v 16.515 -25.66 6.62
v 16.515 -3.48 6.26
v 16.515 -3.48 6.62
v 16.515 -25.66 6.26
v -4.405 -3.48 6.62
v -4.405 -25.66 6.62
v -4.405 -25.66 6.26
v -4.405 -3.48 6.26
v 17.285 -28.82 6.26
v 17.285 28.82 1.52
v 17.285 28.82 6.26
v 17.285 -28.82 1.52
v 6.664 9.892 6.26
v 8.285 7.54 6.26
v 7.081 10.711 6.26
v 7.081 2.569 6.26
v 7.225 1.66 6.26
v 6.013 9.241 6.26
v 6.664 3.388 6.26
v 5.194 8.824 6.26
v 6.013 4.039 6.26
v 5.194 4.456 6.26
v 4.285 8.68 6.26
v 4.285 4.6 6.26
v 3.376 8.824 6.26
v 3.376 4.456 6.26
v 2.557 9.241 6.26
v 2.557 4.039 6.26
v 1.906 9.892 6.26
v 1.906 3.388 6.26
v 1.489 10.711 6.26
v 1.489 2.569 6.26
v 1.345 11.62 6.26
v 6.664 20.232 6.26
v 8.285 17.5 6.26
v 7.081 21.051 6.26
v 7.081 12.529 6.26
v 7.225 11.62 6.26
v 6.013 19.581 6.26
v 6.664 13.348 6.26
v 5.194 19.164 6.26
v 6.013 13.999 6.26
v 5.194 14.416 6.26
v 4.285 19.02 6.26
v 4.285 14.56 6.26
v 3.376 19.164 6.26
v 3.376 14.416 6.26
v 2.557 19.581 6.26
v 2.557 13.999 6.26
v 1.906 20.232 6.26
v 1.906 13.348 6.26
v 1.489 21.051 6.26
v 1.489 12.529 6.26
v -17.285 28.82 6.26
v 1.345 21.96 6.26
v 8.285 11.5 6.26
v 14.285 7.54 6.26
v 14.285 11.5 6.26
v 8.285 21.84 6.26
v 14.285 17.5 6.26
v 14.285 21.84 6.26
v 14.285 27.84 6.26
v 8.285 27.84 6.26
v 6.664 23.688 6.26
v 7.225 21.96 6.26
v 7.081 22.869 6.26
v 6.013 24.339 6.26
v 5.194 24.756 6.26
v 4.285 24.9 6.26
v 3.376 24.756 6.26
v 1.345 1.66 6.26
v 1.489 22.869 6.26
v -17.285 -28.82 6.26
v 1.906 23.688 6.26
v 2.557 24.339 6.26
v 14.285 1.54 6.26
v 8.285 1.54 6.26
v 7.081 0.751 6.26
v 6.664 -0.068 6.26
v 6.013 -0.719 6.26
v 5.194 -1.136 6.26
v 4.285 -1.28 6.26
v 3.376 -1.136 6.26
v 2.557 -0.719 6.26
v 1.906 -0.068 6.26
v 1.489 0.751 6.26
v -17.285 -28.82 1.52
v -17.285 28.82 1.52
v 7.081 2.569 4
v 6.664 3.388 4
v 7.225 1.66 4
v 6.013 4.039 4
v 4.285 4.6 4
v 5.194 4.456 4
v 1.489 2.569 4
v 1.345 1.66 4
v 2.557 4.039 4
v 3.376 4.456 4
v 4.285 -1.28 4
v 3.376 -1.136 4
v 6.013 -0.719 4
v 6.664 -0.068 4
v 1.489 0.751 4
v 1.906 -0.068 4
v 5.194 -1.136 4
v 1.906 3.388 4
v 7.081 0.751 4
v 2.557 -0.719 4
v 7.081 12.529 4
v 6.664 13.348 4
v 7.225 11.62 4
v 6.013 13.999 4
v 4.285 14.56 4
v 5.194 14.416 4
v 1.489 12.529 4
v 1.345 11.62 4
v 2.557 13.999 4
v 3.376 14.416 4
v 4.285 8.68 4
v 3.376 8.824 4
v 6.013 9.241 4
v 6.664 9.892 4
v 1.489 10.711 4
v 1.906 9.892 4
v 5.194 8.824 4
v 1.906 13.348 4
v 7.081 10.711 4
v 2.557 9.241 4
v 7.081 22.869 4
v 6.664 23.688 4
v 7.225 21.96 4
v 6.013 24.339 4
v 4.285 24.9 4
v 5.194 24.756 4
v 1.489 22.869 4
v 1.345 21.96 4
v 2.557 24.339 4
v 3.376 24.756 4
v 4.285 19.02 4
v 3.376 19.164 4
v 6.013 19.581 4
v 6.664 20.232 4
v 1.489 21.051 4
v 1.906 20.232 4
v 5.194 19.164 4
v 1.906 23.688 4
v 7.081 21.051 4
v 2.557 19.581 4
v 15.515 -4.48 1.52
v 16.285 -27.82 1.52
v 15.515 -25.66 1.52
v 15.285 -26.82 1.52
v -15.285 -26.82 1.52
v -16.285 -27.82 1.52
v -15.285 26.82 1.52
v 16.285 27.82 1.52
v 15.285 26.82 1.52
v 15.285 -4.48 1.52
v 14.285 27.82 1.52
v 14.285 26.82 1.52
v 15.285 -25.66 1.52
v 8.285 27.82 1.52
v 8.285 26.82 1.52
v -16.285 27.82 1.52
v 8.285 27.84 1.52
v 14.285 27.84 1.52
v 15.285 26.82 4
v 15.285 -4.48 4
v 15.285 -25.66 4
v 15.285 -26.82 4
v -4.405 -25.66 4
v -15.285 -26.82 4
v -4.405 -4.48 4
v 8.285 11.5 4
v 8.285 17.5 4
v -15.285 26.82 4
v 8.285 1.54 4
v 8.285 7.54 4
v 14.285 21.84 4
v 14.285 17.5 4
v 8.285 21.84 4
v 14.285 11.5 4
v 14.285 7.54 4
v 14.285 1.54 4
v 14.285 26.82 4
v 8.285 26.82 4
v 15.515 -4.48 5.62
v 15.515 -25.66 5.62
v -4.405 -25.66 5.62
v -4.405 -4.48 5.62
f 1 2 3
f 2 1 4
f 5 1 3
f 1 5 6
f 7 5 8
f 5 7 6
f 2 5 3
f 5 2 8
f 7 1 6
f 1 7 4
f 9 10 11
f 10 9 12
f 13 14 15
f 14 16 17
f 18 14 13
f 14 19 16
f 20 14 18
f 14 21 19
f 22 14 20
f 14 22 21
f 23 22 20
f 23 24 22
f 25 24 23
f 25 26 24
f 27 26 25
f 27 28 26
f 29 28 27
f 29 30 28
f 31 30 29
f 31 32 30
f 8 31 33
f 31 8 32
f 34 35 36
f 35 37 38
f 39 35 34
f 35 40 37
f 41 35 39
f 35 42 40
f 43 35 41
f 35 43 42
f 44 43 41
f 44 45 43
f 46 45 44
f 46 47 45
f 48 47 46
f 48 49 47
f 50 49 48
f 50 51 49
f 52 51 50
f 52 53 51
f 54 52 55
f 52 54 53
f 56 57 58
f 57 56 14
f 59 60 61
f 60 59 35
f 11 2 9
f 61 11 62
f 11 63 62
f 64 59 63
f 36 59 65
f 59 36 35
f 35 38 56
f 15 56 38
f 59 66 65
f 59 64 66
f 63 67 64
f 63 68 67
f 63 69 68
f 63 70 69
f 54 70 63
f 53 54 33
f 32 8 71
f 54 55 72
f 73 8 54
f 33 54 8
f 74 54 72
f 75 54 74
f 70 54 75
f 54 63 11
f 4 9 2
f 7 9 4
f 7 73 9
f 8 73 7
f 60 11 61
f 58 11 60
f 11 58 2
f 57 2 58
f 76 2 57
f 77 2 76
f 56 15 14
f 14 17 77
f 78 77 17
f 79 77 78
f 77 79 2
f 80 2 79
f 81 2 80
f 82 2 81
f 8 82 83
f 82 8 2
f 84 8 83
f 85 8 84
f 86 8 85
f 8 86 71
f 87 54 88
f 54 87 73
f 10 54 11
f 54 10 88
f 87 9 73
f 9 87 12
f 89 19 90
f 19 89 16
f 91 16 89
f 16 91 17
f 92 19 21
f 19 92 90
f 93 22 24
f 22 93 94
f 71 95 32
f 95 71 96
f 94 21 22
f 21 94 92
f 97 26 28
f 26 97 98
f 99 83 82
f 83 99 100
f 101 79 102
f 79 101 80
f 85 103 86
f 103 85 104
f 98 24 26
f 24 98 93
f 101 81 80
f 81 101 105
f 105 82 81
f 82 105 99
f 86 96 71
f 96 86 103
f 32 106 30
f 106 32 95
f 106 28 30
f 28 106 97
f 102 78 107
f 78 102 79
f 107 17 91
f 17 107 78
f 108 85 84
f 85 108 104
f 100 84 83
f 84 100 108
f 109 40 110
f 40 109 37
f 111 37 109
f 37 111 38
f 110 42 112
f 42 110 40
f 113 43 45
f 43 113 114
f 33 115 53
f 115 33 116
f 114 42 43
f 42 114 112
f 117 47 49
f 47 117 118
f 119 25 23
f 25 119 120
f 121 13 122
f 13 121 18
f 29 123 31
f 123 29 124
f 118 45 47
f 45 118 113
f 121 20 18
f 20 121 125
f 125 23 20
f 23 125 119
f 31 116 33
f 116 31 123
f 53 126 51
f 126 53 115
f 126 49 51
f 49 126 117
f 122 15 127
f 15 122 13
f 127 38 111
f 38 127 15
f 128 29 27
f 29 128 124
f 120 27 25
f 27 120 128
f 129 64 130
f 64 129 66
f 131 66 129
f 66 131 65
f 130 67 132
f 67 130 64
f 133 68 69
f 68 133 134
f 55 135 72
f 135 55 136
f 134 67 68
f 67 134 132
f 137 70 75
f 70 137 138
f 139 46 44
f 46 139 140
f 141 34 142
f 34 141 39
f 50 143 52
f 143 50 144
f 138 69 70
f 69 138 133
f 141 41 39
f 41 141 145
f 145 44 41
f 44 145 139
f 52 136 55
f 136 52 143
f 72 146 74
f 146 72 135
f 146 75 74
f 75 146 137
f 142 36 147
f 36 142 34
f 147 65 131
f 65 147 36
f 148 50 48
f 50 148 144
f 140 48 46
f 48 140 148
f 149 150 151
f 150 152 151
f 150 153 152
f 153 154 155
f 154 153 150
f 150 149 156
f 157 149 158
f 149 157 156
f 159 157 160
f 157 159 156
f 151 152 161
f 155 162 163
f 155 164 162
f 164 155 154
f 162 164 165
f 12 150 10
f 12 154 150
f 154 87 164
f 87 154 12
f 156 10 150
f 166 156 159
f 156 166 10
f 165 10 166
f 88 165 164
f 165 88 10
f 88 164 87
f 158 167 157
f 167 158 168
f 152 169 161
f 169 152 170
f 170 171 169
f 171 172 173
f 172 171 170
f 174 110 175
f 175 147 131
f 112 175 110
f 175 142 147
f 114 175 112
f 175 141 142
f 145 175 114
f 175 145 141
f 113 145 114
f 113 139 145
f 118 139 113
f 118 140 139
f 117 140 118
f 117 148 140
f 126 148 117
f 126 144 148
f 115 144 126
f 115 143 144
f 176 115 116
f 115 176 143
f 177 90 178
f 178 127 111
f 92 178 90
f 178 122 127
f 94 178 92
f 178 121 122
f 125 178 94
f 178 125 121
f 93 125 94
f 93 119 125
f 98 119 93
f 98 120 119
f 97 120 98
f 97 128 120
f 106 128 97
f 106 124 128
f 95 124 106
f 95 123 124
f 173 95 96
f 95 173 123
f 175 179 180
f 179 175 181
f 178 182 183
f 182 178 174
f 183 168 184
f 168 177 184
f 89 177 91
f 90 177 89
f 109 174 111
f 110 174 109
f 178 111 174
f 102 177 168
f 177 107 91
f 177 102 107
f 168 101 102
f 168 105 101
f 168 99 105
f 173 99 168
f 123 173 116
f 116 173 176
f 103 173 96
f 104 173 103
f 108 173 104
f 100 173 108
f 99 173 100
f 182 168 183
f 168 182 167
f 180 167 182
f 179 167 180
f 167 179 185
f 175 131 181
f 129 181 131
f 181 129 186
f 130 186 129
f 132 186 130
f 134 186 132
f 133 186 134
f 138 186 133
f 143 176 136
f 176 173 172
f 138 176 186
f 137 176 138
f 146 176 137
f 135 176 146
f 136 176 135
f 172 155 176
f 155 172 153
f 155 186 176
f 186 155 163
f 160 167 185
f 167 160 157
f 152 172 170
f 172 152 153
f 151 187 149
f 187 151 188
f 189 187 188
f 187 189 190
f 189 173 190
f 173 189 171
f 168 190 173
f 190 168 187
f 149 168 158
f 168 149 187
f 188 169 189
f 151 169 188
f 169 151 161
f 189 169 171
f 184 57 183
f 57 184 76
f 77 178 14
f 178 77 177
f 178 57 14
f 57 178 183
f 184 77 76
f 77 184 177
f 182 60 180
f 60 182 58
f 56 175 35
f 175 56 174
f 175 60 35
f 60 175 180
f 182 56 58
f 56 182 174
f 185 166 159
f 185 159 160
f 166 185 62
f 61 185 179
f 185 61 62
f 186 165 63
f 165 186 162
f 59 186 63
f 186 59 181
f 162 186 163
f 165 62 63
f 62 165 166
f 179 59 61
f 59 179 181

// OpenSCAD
// exact measurements

pcb_width = 32.57;
pcb_length = 55.64;
pcb_thick = 1.52;

pcb_x_edge = pcb_width / 2;
pcb_y_edge = pcb_length / 2;

led_diameter = 5.88; // diameter of the lip on the bottom of the led.
led_radius = led_diameter / 2;

button_width = 6;

component_clearance = 4; // for resisters
lead_clearance = 3;

battery_size = [19.92,21.18,5.62 - pcb_thick];
battery_left_offset = 2.16;
battery_bottom_offset = 0.77;

clearance_padding = 1; // lip on the edge of the pcb

// button_height = 5.11 - pcb_thick;
button_height = 10;
button_x = pcb_x_edge - 8.26;
 
led_positions = [pcb_y_edge - 7.54, pcb_y_edge - 17.50, pcb_y_edge - 27.84];

led_height = 9; // total highe of cylinder and cap hemisphere


battery_pos = [pcb_width/2 - battery_size[0] - battery_bottom_offset,-1 * pcb_length/2 + battery_left_offset];

intersection() {
  split();
  difference() {
    case();
    pcb();
  }
}

module split() {
  translate([-50,-50,pcb_thick]) cube([100,100,100]);
}

module case() {
  union() {
    translate([battery_pos[0],battery_pos[1],pcb_thick]) cube([battery_size[0] + 1, battery_size[1] + 1, battery_size[2] + 1]);
    translate([0,0,component_clearance - lead_clearance]) cube([pcb_width + 2, pcb_length + 2, pcb_thick + lead_clearance + component_clearance + 2],center=true);
  }
}

module pcb() {
  union() {

    // pcb
    color("green") translate([0,0,pcb_thick / 2]) cube([pcb_width, pcb_length, pcb_thick],center=true);

    // component room
    comp_clear_width = pcb_width - clearance_padding * 2;
    comp_clear_length = pcb_length - clearance_padding * 2;
    comp_clear_thick = component_clearance;
    translate([0,0,comp_clear_thick / 2]) 
      cube([
        comp_clear_width,
        comp_clear_length,
        comp_clear_thick
      ],center=true);

    // leads room
    lead_clear_thick = lead_clearance + pcb_thick;
    translate([0,0, lead_clear_thick / 2 - pcb_thick])
      cube([
          comp_clear_width,
          comp_clear_length,
          lead_clear_thick
      ], center=true);
    translate([10, -pcb_length / 2, -pcb_thick]) cube([4,lead_clearance,pcb_thick]);

    // battery pack
    color("lightblue") translate([battery_pos[0],battery_pos[1],pcb_thick]) cube(battery_size);

    // leds
    led_offset = pcb_x_edge - 12;
    color("red")   LED([led_offset,pcb_y_edge - led_positions[0] - led_diameter,pcb_thick]);
    color("blue")  LED([led_offset,pcb_y_edge - led_positions[1] - led_diameter,pcb_thick]);
    color("green") LED([led_offset,pcb_y_edge - led_positions[2] - led_diameter,pcb_thick]);

    button_width = 6;
    button_offset = 2;
    button_position = pcb_width / 2 - button_width - button_offset;
    Button(button_width, [button_position,pcb_y_edge - led_positions[0] - button_width,pcb_thick]);
    Button(button_width, [button_position,pcb_y_edge - led_positions[1] - button_width,pcb_thick]);
    Button(button_width, [button_position,pcb_y_edge - led_positions[2] - button_width,pcb_thick]);
  }
}

module LED(position) {

  $fn = 20;

  cylinder_height = led_height - led_radius;
  translate(position)
    union() {
      cylinder(r=led_radius, h=cylinder_height);
      translate([0,0,cylinder_height]) sphere(r=led_radius);
    }
}

module Button(button_width, position) {
  color("black")
    translate(position)
      cube([button_width, button_width, button_height]);
}
